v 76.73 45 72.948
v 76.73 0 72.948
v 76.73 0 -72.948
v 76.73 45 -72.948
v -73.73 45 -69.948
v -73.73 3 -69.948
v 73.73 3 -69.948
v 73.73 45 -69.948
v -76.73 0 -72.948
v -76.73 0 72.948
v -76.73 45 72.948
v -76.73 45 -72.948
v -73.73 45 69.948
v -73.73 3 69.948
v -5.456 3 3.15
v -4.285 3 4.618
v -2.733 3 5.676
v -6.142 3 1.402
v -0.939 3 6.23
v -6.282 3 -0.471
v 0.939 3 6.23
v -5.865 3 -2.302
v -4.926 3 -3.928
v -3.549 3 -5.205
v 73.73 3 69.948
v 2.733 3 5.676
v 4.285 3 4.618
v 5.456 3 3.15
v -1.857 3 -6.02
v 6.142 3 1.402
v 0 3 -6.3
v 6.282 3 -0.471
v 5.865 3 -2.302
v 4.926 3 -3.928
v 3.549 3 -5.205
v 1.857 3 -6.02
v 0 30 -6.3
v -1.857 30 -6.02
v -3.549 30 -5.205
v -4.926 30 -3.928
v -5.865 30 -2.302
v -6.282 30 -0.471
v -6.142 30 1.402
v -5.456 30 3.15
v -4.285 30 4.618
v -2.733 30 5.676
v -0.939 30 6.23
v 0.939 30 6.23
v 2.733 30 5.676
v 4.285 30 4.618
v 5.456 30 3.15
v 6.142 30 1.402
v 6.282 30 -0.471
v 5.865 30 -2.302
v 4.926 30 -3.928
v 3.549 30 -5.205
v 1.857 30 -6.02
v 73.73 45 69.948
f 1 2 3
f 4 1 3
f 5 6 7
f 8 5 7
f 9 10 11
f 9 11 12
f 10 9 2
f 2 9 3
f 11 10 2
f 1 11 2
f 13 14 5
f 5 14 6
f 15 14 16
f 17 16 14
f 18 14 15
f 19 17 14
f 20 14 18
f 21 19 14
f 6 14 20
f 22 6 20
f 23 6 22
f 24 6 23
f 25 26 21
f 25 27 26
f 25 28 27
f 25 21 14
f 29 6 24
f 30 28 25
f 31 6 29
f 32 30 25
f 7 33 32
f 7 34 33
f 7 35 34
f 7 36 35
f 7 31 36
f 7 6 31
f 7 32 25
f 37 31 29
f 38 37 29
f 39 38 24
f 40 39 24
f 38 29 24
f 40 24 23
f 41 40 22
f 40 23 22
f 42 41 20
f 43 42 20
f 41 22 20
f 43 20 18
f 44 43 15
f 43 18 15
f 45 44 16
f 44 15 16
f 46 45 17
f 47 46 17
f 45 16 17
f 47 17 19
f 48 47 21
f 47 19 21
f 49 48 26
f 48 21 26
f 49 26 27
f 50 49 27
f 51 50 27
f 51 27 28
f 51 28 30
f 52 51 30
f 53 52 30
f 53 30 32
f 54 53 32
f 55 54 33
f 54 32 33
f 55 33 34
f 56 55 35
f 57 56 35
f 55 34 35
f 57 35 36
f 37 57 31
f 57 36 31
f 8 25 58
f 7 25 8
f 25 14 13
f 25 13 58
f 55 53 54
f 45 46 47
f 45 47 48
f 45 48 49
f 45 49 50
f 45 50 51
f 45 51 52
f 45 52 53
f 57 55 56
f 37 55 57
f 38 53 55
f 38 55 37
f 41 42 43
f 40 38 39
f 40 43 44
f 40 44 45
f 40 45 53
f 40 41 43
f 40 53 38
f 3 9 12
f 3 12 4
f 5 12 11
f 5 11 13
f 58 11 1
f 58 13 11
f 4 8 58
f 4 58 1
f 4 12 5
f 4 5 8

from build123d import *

# Parameters (mm, degrees)
SKETCH1_W           = 511.53
SKETCH1_H           = 486.32
BOSS_EXTRUDE1_DEPTH = 150
SHELL1_T            = -10
SKETCH2_R           = 21
BOSS_EXTRUDE2_DEPTH = 90
SCALE1_SCALE        = 0.1
SCALE2_SCALE        = 3


with BuildPart() as part:
    # Sketch1 → Boss-Extrude1 (new body)
    with BuildSketch(Plane(origin=(0, 0, 0), x_dir=(1, 0, 0), z_dir=(0, 1, 0))):
        Rectangle(SKETCH1_W, SKETCH1_H)
    extrude(amount=BOSS_EXTRUDE1_DEPTH)

    # Shell1
    shell1_openings = [part.faces().sort_by_distance(p)[0] for p in [
        (0, 150, 0),
    ]]
    offset(amount=SHELL1_T, openings=shell1_openings, kind=Kind.INTERSECTION)

    # Sketch2 → Boss-Extrude2 (add)
    with BuildSketch(Plane(origin=(0, 10, 0), x_dir=(1, 0, 0), z_dir=(0, 1, 0))):
        with Locations(Location((0, 0, 0), (0, 0, 90))):
            Circle(SKETCH2_R)
    extrude(amount=BOSS_EXTRUDE2_DEPTH)


with BuildPart() as part_1:
    # Scale1: scaled about (0, 0, 0)
    add(part.part.scale(SCALE1_SCALE))


with BuildPart() as part_2:
    # Scale2: scaled about (0, 0, 0)
    add(part_1.part.scale(SCALE2_SCALE))


solid = part_2.part
